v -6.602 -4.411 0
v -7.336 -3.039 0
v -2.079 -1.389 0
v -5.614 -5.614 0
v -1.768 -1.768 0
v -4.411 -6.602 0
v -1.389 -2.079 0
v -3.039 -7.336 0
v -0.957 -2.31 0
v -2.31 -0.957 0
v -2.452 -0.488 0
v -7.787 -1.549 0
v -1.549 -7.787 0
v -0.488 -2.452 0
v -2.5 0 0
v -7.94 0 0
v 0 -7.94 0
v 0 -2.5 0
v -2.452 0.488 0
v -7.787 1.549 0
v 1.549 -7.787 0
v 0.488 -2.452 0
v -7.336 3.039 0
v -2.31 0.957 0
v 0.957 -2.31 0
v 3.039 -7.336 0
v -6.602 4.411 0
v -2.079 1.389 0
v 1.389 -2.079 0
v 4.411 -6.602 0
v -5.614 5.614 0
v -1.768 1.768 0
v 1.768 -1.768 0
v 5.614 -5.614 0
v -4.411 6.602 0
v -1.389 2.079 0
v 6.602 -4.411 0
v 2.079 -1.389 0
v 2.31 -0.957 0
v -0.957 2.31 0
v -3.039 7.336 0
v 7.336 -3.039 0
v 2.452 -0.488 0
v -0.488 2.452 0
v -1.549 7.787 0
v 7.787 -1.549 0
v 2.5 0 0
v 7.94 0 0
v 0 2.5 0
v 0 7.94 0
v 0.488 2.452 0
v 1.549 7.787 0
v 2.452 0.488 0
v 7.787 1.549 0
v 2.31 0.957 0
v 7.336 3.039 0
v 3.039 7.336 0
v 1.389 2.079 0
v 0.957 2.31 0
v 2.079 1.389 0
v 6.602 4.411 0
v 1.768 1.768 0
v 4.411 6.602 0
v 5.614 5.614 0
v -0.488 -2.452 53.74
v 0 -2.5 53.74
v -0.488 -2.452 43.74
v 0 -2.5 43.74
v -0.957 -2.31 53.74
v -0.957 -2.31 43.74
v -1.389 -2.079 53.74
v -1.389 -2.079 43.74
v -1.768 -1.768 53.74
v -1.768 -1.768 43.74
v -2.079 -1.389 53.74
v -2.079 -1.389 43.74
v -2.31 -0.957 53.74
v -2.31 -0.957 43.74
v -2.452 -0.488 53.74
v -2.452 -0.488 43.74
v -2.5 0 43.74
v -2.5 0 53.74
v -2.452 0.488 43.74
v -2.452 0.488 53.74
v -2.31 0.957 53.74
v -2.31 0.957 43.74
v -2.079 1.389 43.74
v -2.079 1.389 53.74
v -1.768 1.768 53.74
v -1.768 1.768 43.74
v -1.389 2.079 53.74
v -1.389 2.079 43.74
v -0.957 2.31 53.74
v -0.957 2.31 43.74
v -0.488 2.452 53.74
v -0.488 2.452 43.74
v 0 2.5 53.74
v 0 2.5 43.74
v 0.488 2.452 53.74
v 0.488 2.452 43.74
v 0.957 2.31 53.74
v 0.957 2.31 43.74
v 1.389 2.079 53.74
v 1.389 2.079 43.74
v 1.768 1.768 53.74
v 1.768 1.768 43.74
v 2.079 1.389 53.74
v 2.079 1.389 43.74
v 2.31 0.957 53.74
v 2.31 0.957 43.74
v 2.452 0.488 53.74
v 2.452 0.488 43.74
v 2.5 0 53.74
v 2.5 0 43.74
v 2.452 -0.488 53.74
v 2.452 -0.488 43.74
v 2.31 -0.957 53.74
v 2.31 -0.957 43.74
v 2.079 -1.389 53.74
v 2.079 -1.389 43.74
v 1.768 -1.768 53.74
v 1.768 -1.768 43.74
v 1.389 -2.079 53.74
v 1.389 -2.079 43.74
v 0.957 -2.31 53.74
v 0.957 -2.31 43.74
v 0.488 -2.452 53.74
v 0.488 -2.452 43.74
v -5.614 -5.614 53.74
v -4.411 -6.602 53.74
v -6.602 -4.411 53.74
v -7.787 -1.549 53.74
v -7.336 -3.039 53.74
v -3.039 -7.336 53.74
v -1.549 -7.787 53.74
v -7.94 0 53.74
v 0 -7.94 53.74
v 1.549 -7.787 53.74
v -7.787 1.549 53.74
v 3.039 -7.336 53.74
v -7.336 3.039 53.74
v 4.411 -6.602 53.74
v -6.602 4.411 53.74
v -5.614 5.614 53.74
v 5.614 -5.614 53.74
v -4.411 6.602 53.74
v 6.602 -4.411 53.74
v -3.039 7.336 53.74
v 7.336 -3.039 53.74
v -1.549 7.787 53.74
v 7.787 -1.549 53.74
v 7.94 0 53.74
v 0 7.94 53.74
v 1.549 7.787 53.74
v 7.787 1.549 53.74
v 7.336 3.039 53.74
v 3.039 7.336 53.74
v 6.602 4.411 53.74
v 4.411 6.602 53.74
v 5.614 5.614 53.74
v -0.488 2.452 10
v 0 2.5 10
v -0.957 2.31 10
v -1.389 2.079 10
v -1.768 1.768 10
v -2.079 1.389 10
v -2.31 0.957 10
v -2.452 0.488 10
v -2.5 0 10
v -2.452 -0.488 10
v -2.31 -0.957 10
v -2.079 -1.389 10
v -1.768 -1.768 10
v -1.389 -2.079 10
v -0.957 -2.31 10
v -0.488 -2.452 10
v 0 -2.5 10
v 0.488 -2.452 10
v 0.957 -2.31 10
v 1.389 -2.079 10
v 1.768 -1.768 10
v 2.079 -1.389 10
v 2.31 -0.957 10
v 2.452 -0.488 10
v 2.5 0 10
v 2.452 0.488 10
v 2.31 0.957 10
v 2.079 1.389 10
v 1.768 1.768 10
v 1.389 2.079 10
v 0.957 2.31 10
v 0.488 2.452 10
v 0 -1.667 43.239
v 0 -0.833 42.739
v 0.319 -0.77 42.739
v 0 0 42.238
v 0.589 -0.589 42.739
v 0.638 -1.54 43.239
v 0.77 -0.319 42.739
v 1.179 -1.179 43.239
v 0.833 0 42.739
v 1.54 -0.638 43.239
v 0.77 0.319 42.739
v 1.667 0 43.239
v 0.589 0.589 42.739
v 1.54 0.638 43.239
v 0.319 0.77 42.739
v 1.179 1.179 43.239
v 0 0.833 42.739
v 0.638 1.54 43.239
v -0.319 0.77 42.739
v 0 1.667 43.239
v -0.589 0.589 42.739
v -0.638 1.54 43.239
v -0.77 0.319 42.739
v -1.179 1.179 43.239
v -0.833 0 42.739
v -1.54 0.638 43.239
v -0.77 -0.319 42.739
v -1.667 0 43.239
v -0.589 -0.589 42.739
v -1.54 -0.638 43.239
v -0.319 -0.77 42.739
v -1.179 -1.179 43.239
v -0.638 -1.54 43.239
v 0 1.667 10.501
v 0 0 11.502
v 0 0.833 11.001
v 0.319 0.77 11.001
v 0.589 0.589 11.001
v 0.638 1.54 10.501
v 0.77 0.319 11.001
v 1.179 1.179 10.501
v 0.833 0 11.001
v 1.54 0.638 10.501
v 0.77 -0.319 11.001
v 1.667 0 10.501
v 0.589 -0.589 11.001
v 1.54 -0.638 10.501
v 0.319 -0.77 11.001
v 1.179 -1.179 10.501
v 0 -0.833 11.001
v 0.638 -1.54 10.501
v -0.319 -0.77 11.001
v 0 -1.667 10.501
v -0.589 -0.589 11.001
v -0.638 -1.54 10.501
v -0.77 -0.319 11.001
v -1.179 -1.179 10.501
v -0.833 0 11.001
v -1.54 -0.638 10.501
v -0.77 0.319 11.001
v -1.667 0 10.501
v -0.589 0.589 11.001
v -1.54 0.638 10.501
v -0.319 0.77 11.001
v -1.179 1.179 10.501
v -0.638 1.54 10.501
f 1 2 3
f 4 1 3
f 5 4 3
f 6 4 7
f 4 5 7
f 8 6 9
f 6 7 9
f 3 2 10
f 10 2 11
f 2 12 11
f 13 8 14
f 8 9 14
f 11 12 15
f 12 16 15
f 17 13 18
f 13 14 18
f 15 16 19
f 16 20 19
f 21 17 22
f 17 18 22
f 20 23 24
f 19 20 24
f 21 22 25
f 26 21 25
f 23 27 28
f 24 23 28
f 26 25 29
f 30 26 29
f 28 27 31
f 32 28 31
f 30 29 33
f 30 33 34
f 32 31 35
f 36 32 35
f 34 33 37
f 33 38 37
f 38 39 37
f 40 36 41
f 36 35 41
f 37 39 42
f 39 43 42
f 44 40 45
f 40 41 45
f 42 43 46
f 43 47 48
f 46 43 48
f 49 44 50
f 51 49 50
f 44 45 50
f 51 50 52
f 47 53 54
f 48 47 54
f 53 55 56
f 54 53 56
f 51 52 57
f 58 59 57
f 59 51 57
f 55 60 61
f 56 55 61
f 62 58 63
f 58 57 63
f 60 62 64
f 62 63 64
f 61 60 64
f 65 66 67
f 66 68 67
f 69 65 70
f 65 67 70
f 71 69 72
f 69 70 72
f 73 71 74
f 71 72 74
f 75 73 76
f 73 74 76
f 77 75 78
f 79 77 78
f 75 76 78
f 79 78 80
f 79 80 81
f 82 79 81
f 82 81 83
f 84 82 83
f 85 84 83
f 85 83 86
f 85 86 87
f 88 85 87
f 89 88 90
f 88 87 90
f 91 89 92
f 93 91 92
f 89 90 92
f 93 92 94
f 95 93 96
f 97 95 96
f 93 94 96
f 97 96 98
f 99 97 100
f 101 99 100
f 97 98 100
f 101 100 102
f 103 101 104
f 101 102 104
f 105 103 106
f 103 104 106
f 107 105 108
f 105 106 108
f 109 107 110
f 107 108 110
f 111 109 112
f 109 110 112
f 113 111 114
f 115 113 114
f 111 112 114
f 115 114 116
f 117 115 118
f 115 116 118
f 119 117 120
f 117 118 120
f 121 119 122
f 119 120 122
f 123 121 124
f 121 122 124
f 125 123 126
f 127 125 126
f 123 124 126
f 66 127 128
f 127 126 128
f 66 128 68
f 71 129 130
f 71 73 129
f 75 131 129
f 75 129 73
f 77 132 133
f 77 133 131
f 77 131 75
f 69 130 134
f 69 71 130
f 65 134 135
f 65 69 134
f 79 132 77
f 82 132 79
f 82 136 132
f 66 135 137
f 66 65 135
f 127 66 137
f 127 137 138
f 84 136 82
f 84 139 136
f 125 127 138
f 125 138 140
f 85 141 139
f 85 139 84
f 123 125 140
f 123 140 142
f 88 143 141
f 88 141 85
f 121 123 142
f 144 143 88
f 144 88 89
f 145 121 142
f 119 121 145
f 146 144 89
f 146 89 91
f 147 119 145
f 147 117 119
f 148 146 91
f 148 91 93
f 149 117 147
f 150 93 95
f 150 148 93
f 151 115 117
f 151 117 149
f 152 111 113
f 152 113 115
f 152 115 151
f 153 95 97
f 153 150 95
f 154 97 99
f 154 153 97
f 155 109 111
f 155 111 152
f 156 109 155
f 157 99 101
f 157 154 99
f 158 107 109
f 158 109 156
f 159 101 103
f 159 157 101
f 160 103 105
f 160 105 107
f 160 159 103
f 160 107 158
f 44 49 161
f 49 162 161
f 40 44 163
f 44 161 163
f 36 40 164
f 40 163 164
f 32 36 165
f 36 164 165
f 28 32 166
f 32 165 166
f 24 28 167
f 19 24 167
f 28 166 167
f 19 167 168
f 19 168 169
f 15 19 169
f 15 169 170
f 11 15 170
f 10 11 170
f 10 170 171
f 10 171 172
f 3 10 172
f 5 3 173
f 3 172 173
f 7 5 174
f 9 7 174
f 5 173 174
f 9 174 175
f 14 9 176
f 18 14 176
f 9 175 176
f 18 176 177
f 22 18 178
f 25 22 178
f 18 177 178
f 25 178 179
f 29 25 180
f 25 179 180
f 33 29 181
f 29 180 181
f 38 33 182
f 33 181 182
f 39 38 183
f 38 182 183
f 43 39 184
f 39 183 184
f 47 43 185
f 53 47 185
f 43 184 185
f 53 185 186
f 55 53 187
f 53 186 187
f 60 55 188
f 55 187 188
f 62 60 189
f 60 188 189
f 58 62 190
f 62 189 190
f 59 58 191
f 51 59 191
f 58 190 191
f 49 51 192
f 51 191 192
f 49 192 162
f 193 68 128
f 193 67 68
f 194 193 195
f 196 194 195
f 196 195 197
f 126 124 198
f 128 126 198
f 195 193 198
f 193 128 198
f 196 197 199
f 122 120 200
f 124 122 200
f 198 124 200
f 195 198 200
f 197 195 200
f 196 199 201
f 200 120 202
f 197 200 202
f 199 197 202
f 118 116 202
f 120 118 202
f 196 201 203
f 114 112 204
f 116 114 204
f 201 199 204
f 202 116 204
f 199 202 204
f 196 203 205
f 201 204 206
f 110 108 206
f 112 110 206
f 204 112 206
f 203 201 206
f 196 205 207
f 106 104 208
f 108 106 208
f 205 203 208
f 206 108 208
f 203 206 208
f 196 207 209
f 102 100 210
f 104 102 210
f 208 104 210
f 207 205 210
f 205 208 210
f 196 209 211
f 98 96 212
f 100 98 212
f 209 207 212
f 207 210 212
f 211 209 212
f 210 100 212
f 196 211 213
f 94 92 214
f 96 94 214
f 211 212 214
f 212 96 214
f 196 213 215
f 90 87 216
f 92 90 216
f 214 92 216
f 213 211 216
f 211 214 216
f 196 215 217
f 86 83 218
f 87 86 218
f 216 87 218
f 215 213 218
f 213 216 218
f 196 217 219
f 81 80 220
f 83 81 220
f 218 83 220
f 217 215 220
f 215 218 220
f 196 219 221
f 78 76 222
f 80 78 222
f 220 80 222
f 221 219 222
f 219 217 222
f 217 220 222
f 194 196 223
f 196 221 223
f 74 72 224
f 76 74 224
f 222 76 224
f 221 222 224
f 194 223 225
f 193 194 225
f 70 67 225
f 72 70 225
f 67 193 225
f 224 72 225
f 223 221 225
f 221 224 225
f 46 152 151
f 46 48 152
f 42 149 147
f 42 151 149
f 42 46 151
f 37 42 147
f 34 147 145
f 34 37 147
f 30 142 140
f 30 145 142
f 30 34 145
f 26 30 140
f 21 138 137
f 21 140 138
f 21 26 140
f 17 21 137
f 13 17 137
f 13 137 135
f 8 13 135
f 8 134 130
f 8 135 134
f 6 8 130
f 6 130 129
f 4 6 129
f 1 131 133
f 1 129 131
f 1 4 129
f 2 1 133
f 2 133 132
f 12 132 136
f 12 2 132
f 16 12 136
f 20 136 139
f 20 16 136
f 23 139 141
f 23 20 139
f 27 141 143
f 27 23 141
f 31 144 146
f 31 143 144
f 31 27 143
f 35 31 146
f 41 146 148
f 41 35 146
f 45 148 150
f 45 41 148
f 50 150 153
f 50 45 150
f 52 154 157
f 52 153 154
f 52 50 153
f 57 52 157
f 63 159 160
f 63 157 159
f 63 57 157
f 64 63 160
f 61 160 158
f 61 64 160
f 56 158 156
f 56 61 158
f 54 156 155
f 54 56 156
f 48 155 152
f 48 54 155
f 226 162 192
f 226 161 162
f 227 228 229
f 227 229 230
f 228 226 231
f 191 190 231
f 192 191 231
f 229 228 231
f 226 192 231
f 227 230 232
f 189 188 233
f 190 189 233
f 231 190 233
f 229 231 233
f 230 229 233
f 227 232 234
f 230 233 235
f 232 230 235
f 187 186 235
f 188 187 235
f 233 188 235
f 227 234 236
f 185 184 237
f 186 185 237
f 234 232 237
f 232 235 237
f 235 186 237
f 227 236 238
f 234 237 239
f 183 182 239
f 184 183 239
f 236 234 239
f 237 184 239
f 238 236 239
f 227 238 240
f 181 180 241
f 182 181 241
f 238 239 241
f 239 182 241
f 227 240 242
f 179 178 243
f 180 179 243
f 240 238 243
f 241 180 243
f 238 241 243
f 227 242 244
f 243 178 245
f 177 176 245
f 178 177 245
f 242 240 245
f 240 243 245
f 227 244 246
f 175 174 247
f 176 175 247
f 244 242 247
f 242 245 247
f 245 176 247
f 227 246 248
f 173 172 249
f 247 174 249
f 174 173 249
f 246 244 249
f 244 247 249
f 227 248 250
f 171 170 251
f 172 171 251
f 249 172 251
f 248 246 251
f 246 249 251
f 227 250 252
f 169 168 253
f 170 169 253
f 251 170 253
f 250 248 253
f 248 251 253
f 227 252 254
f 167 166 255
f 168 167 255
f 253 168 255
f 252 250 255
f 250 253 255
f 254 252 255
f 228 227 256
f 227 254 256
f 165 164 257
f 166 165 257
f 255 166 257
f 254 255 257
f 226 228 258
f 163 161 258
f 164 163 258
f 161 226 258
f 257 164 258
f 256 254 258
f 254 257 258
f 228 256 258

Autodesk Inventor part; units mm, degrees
ref_plane "YZ Plane" through (0, 0, 0) normal (1, 0, 0) x (0, 1, 0)
ref_plane "XZ Plane" through (0, 0, 0) normal (0, 1, 0) x (-1, 0, 0)
ref_plane "XY Plane" through (0, 0, 0) normal (0, 0, 1) x (1, 0, 0)
sketch "Boceto1" plane through (0, 0, 0) normal (0, 0, 1) x (1, 0, 0)
  circle A0 centre (0, 0) radius 7.94
  dimension "d0" = 15.88
extrude "Extrusión1" add sketch "Boceto1" along normal blind 53.74
sketch "Boceto4" plane through (0, 0, 0) normal (0, 0, -1) x (-1, 0, 0)
  circle A0 centre (0, 0) radius 1.7349
sketch "Boceto5" plane through (0, 0, 53.74) normal (0, 0, 1) x (1, 0, 0)
  circle A0 centre (0, 0) radius 2.5
  dimension "d17" = 5
hole "Agujero1" at (0, 0, 0) direction (0, 0, 1) diameter 5 depth 10 tip angle 118
hole "Agujero2" at (0, 0, 53.74) direction (0, 0, -1) diameter 5 depth 10 tip angle 118
thread "Rosca5" size "M5x0.8" class "6H" standard "ANSI Metric M Profile" length 8
thread "Rosca6" size "M5x0.8" class "6H" standard "ANSI Metric M Profile" length 8
properties part number "Barras_Soporte_superior" material "Acero inoxidable"
